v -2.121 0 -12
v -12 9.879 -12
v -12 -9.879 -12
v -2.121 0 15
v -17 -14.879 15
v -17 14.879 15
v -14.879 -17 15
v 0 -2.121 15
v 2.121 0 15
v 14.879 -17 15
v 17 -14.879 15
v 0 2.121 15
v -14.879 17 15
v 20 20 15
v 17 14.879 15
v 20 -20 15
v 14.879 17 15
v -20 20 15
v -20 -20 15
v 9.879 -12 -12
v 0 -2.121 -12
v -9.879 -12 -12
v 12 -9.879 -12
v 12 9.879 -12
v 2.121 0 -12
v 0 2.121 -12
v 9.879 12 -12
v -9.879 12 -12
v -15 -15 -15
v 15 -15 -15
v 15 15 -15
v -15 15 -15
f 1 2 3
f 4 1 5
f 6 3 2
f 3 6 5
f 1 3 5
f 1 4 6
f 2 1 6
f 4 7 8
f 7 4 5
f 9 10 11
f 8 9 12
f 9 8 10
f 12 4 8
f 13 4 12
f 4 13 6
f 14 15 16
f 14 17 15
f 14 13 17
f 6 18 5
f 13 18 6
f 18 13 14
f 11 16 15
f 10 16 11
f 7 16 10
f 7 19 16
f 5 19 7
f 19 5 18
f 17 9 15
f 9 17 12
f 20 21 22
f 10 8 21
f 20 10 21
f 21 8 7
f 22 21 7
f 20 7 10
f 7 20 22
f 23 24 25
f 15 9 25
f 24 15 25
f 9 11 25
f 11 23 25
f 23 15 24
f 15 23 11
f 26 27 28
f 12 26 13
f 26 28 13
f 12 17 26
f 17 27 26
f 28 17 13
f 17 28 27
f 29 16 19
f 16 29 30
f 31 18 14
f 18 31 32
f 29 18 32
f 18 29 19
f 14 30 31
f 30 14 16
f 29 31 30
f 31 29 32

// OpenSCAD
//heighth
heighth=30;
//width at bottom
length_bottom=15;
//width at top
length_top=20;
//wall strength
wall=3;

hh=heighth/2;
dia = wall * 0.5 * sqrt(2);

difference(){
m_hull();
ausschnitt();
}

module ausschnitt()
{
  for(i=[0:90:270]){
    rotate([0,0,i])polyhedron(points = [
        [-length_bottom+wall,-length_bottom+wall+dia, -hh+wall], [-length_bottom+wall,length_bottom-wall-dia, -hh+wall], [-dia, 0, -hh+wall],
        [-length_top+wall,-length_top+wall+dia, hh], [-length_top+wall,length_top-wall-dia, hh], [-dia,0, hh]],
    faces=[[0,2,1], [3,4,5],[0,1,3],[1,4,3], [1,2,4], [2,5,4], [2,0,3], [2,3,5] ]);
  }
}

module m_hull()
{

polyhedron(points = [ [-length_bottom,-length_bottom, -hh],[length_bottom,-length_bottom, -hh],[length_bottom,length_bottom, -hh],[-length_bottom,length_bottom, -hh],
           [-length_top,-length_top, hh],[length_top,-length_top, hh],[length_top,length_top, hh],[-length_top,length_top, hh]],
faces=[[1,2,0],[2,3,0],[4,6,5],[4,7,6],
[0,5,1],[0,4,5], [1,5,2],[2,5,6], [6,7,2],[2,7,3],
[0,3,7],[0,7,4]]);

}
